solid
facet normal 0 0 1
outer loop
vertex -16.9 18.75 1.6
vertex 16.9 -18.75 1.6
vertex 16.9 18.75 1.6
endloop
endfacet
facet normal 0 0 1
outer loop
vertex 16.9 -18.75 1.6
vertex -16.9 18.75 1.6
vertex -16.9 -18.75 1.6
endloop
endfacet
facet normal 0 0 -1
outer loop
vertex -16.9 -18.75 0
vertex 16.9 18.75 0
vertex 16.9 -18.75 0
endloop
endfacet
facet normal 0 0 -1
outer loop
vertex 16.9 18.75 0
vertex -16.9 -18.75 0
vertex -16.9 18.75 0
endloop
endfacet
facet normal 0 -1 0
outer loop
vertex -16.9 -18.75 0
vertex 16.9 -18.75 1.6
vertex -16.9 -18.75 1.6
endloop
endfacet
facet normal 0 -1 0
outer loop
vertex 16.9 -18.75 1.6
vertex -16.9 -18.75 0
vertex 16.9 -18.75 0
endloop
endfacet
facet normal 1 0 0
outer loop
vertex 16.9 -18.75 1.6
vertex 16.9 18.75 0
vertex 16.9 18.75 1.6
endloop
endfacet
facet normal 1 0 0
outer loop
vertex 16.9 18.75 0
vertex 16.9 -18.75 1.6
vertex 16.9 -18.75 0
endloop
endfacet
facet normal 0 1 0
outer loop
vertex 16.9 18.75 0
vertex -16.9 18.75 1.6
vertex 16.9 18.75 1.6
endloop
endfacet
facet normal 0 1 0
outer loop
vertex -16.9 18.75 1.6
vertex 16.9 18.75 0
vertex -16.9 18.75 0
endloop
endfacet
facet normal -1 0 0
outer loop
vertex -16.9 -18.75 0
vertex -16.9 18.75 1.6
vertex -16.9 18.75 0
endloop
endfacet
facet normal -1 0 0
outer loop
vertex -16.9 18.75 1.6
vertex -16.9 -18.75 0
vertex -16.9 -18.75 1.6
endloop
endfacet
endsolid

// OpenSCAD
$fn = 64;

board_x = 33.8;
board_y = 37.5;
board_th = 1.6;

color([0.05, 0.45, 0.12])
translate([-board_x/2, -board_y/2, 0])
cube([board_x, board_y, board_th], center=false);
